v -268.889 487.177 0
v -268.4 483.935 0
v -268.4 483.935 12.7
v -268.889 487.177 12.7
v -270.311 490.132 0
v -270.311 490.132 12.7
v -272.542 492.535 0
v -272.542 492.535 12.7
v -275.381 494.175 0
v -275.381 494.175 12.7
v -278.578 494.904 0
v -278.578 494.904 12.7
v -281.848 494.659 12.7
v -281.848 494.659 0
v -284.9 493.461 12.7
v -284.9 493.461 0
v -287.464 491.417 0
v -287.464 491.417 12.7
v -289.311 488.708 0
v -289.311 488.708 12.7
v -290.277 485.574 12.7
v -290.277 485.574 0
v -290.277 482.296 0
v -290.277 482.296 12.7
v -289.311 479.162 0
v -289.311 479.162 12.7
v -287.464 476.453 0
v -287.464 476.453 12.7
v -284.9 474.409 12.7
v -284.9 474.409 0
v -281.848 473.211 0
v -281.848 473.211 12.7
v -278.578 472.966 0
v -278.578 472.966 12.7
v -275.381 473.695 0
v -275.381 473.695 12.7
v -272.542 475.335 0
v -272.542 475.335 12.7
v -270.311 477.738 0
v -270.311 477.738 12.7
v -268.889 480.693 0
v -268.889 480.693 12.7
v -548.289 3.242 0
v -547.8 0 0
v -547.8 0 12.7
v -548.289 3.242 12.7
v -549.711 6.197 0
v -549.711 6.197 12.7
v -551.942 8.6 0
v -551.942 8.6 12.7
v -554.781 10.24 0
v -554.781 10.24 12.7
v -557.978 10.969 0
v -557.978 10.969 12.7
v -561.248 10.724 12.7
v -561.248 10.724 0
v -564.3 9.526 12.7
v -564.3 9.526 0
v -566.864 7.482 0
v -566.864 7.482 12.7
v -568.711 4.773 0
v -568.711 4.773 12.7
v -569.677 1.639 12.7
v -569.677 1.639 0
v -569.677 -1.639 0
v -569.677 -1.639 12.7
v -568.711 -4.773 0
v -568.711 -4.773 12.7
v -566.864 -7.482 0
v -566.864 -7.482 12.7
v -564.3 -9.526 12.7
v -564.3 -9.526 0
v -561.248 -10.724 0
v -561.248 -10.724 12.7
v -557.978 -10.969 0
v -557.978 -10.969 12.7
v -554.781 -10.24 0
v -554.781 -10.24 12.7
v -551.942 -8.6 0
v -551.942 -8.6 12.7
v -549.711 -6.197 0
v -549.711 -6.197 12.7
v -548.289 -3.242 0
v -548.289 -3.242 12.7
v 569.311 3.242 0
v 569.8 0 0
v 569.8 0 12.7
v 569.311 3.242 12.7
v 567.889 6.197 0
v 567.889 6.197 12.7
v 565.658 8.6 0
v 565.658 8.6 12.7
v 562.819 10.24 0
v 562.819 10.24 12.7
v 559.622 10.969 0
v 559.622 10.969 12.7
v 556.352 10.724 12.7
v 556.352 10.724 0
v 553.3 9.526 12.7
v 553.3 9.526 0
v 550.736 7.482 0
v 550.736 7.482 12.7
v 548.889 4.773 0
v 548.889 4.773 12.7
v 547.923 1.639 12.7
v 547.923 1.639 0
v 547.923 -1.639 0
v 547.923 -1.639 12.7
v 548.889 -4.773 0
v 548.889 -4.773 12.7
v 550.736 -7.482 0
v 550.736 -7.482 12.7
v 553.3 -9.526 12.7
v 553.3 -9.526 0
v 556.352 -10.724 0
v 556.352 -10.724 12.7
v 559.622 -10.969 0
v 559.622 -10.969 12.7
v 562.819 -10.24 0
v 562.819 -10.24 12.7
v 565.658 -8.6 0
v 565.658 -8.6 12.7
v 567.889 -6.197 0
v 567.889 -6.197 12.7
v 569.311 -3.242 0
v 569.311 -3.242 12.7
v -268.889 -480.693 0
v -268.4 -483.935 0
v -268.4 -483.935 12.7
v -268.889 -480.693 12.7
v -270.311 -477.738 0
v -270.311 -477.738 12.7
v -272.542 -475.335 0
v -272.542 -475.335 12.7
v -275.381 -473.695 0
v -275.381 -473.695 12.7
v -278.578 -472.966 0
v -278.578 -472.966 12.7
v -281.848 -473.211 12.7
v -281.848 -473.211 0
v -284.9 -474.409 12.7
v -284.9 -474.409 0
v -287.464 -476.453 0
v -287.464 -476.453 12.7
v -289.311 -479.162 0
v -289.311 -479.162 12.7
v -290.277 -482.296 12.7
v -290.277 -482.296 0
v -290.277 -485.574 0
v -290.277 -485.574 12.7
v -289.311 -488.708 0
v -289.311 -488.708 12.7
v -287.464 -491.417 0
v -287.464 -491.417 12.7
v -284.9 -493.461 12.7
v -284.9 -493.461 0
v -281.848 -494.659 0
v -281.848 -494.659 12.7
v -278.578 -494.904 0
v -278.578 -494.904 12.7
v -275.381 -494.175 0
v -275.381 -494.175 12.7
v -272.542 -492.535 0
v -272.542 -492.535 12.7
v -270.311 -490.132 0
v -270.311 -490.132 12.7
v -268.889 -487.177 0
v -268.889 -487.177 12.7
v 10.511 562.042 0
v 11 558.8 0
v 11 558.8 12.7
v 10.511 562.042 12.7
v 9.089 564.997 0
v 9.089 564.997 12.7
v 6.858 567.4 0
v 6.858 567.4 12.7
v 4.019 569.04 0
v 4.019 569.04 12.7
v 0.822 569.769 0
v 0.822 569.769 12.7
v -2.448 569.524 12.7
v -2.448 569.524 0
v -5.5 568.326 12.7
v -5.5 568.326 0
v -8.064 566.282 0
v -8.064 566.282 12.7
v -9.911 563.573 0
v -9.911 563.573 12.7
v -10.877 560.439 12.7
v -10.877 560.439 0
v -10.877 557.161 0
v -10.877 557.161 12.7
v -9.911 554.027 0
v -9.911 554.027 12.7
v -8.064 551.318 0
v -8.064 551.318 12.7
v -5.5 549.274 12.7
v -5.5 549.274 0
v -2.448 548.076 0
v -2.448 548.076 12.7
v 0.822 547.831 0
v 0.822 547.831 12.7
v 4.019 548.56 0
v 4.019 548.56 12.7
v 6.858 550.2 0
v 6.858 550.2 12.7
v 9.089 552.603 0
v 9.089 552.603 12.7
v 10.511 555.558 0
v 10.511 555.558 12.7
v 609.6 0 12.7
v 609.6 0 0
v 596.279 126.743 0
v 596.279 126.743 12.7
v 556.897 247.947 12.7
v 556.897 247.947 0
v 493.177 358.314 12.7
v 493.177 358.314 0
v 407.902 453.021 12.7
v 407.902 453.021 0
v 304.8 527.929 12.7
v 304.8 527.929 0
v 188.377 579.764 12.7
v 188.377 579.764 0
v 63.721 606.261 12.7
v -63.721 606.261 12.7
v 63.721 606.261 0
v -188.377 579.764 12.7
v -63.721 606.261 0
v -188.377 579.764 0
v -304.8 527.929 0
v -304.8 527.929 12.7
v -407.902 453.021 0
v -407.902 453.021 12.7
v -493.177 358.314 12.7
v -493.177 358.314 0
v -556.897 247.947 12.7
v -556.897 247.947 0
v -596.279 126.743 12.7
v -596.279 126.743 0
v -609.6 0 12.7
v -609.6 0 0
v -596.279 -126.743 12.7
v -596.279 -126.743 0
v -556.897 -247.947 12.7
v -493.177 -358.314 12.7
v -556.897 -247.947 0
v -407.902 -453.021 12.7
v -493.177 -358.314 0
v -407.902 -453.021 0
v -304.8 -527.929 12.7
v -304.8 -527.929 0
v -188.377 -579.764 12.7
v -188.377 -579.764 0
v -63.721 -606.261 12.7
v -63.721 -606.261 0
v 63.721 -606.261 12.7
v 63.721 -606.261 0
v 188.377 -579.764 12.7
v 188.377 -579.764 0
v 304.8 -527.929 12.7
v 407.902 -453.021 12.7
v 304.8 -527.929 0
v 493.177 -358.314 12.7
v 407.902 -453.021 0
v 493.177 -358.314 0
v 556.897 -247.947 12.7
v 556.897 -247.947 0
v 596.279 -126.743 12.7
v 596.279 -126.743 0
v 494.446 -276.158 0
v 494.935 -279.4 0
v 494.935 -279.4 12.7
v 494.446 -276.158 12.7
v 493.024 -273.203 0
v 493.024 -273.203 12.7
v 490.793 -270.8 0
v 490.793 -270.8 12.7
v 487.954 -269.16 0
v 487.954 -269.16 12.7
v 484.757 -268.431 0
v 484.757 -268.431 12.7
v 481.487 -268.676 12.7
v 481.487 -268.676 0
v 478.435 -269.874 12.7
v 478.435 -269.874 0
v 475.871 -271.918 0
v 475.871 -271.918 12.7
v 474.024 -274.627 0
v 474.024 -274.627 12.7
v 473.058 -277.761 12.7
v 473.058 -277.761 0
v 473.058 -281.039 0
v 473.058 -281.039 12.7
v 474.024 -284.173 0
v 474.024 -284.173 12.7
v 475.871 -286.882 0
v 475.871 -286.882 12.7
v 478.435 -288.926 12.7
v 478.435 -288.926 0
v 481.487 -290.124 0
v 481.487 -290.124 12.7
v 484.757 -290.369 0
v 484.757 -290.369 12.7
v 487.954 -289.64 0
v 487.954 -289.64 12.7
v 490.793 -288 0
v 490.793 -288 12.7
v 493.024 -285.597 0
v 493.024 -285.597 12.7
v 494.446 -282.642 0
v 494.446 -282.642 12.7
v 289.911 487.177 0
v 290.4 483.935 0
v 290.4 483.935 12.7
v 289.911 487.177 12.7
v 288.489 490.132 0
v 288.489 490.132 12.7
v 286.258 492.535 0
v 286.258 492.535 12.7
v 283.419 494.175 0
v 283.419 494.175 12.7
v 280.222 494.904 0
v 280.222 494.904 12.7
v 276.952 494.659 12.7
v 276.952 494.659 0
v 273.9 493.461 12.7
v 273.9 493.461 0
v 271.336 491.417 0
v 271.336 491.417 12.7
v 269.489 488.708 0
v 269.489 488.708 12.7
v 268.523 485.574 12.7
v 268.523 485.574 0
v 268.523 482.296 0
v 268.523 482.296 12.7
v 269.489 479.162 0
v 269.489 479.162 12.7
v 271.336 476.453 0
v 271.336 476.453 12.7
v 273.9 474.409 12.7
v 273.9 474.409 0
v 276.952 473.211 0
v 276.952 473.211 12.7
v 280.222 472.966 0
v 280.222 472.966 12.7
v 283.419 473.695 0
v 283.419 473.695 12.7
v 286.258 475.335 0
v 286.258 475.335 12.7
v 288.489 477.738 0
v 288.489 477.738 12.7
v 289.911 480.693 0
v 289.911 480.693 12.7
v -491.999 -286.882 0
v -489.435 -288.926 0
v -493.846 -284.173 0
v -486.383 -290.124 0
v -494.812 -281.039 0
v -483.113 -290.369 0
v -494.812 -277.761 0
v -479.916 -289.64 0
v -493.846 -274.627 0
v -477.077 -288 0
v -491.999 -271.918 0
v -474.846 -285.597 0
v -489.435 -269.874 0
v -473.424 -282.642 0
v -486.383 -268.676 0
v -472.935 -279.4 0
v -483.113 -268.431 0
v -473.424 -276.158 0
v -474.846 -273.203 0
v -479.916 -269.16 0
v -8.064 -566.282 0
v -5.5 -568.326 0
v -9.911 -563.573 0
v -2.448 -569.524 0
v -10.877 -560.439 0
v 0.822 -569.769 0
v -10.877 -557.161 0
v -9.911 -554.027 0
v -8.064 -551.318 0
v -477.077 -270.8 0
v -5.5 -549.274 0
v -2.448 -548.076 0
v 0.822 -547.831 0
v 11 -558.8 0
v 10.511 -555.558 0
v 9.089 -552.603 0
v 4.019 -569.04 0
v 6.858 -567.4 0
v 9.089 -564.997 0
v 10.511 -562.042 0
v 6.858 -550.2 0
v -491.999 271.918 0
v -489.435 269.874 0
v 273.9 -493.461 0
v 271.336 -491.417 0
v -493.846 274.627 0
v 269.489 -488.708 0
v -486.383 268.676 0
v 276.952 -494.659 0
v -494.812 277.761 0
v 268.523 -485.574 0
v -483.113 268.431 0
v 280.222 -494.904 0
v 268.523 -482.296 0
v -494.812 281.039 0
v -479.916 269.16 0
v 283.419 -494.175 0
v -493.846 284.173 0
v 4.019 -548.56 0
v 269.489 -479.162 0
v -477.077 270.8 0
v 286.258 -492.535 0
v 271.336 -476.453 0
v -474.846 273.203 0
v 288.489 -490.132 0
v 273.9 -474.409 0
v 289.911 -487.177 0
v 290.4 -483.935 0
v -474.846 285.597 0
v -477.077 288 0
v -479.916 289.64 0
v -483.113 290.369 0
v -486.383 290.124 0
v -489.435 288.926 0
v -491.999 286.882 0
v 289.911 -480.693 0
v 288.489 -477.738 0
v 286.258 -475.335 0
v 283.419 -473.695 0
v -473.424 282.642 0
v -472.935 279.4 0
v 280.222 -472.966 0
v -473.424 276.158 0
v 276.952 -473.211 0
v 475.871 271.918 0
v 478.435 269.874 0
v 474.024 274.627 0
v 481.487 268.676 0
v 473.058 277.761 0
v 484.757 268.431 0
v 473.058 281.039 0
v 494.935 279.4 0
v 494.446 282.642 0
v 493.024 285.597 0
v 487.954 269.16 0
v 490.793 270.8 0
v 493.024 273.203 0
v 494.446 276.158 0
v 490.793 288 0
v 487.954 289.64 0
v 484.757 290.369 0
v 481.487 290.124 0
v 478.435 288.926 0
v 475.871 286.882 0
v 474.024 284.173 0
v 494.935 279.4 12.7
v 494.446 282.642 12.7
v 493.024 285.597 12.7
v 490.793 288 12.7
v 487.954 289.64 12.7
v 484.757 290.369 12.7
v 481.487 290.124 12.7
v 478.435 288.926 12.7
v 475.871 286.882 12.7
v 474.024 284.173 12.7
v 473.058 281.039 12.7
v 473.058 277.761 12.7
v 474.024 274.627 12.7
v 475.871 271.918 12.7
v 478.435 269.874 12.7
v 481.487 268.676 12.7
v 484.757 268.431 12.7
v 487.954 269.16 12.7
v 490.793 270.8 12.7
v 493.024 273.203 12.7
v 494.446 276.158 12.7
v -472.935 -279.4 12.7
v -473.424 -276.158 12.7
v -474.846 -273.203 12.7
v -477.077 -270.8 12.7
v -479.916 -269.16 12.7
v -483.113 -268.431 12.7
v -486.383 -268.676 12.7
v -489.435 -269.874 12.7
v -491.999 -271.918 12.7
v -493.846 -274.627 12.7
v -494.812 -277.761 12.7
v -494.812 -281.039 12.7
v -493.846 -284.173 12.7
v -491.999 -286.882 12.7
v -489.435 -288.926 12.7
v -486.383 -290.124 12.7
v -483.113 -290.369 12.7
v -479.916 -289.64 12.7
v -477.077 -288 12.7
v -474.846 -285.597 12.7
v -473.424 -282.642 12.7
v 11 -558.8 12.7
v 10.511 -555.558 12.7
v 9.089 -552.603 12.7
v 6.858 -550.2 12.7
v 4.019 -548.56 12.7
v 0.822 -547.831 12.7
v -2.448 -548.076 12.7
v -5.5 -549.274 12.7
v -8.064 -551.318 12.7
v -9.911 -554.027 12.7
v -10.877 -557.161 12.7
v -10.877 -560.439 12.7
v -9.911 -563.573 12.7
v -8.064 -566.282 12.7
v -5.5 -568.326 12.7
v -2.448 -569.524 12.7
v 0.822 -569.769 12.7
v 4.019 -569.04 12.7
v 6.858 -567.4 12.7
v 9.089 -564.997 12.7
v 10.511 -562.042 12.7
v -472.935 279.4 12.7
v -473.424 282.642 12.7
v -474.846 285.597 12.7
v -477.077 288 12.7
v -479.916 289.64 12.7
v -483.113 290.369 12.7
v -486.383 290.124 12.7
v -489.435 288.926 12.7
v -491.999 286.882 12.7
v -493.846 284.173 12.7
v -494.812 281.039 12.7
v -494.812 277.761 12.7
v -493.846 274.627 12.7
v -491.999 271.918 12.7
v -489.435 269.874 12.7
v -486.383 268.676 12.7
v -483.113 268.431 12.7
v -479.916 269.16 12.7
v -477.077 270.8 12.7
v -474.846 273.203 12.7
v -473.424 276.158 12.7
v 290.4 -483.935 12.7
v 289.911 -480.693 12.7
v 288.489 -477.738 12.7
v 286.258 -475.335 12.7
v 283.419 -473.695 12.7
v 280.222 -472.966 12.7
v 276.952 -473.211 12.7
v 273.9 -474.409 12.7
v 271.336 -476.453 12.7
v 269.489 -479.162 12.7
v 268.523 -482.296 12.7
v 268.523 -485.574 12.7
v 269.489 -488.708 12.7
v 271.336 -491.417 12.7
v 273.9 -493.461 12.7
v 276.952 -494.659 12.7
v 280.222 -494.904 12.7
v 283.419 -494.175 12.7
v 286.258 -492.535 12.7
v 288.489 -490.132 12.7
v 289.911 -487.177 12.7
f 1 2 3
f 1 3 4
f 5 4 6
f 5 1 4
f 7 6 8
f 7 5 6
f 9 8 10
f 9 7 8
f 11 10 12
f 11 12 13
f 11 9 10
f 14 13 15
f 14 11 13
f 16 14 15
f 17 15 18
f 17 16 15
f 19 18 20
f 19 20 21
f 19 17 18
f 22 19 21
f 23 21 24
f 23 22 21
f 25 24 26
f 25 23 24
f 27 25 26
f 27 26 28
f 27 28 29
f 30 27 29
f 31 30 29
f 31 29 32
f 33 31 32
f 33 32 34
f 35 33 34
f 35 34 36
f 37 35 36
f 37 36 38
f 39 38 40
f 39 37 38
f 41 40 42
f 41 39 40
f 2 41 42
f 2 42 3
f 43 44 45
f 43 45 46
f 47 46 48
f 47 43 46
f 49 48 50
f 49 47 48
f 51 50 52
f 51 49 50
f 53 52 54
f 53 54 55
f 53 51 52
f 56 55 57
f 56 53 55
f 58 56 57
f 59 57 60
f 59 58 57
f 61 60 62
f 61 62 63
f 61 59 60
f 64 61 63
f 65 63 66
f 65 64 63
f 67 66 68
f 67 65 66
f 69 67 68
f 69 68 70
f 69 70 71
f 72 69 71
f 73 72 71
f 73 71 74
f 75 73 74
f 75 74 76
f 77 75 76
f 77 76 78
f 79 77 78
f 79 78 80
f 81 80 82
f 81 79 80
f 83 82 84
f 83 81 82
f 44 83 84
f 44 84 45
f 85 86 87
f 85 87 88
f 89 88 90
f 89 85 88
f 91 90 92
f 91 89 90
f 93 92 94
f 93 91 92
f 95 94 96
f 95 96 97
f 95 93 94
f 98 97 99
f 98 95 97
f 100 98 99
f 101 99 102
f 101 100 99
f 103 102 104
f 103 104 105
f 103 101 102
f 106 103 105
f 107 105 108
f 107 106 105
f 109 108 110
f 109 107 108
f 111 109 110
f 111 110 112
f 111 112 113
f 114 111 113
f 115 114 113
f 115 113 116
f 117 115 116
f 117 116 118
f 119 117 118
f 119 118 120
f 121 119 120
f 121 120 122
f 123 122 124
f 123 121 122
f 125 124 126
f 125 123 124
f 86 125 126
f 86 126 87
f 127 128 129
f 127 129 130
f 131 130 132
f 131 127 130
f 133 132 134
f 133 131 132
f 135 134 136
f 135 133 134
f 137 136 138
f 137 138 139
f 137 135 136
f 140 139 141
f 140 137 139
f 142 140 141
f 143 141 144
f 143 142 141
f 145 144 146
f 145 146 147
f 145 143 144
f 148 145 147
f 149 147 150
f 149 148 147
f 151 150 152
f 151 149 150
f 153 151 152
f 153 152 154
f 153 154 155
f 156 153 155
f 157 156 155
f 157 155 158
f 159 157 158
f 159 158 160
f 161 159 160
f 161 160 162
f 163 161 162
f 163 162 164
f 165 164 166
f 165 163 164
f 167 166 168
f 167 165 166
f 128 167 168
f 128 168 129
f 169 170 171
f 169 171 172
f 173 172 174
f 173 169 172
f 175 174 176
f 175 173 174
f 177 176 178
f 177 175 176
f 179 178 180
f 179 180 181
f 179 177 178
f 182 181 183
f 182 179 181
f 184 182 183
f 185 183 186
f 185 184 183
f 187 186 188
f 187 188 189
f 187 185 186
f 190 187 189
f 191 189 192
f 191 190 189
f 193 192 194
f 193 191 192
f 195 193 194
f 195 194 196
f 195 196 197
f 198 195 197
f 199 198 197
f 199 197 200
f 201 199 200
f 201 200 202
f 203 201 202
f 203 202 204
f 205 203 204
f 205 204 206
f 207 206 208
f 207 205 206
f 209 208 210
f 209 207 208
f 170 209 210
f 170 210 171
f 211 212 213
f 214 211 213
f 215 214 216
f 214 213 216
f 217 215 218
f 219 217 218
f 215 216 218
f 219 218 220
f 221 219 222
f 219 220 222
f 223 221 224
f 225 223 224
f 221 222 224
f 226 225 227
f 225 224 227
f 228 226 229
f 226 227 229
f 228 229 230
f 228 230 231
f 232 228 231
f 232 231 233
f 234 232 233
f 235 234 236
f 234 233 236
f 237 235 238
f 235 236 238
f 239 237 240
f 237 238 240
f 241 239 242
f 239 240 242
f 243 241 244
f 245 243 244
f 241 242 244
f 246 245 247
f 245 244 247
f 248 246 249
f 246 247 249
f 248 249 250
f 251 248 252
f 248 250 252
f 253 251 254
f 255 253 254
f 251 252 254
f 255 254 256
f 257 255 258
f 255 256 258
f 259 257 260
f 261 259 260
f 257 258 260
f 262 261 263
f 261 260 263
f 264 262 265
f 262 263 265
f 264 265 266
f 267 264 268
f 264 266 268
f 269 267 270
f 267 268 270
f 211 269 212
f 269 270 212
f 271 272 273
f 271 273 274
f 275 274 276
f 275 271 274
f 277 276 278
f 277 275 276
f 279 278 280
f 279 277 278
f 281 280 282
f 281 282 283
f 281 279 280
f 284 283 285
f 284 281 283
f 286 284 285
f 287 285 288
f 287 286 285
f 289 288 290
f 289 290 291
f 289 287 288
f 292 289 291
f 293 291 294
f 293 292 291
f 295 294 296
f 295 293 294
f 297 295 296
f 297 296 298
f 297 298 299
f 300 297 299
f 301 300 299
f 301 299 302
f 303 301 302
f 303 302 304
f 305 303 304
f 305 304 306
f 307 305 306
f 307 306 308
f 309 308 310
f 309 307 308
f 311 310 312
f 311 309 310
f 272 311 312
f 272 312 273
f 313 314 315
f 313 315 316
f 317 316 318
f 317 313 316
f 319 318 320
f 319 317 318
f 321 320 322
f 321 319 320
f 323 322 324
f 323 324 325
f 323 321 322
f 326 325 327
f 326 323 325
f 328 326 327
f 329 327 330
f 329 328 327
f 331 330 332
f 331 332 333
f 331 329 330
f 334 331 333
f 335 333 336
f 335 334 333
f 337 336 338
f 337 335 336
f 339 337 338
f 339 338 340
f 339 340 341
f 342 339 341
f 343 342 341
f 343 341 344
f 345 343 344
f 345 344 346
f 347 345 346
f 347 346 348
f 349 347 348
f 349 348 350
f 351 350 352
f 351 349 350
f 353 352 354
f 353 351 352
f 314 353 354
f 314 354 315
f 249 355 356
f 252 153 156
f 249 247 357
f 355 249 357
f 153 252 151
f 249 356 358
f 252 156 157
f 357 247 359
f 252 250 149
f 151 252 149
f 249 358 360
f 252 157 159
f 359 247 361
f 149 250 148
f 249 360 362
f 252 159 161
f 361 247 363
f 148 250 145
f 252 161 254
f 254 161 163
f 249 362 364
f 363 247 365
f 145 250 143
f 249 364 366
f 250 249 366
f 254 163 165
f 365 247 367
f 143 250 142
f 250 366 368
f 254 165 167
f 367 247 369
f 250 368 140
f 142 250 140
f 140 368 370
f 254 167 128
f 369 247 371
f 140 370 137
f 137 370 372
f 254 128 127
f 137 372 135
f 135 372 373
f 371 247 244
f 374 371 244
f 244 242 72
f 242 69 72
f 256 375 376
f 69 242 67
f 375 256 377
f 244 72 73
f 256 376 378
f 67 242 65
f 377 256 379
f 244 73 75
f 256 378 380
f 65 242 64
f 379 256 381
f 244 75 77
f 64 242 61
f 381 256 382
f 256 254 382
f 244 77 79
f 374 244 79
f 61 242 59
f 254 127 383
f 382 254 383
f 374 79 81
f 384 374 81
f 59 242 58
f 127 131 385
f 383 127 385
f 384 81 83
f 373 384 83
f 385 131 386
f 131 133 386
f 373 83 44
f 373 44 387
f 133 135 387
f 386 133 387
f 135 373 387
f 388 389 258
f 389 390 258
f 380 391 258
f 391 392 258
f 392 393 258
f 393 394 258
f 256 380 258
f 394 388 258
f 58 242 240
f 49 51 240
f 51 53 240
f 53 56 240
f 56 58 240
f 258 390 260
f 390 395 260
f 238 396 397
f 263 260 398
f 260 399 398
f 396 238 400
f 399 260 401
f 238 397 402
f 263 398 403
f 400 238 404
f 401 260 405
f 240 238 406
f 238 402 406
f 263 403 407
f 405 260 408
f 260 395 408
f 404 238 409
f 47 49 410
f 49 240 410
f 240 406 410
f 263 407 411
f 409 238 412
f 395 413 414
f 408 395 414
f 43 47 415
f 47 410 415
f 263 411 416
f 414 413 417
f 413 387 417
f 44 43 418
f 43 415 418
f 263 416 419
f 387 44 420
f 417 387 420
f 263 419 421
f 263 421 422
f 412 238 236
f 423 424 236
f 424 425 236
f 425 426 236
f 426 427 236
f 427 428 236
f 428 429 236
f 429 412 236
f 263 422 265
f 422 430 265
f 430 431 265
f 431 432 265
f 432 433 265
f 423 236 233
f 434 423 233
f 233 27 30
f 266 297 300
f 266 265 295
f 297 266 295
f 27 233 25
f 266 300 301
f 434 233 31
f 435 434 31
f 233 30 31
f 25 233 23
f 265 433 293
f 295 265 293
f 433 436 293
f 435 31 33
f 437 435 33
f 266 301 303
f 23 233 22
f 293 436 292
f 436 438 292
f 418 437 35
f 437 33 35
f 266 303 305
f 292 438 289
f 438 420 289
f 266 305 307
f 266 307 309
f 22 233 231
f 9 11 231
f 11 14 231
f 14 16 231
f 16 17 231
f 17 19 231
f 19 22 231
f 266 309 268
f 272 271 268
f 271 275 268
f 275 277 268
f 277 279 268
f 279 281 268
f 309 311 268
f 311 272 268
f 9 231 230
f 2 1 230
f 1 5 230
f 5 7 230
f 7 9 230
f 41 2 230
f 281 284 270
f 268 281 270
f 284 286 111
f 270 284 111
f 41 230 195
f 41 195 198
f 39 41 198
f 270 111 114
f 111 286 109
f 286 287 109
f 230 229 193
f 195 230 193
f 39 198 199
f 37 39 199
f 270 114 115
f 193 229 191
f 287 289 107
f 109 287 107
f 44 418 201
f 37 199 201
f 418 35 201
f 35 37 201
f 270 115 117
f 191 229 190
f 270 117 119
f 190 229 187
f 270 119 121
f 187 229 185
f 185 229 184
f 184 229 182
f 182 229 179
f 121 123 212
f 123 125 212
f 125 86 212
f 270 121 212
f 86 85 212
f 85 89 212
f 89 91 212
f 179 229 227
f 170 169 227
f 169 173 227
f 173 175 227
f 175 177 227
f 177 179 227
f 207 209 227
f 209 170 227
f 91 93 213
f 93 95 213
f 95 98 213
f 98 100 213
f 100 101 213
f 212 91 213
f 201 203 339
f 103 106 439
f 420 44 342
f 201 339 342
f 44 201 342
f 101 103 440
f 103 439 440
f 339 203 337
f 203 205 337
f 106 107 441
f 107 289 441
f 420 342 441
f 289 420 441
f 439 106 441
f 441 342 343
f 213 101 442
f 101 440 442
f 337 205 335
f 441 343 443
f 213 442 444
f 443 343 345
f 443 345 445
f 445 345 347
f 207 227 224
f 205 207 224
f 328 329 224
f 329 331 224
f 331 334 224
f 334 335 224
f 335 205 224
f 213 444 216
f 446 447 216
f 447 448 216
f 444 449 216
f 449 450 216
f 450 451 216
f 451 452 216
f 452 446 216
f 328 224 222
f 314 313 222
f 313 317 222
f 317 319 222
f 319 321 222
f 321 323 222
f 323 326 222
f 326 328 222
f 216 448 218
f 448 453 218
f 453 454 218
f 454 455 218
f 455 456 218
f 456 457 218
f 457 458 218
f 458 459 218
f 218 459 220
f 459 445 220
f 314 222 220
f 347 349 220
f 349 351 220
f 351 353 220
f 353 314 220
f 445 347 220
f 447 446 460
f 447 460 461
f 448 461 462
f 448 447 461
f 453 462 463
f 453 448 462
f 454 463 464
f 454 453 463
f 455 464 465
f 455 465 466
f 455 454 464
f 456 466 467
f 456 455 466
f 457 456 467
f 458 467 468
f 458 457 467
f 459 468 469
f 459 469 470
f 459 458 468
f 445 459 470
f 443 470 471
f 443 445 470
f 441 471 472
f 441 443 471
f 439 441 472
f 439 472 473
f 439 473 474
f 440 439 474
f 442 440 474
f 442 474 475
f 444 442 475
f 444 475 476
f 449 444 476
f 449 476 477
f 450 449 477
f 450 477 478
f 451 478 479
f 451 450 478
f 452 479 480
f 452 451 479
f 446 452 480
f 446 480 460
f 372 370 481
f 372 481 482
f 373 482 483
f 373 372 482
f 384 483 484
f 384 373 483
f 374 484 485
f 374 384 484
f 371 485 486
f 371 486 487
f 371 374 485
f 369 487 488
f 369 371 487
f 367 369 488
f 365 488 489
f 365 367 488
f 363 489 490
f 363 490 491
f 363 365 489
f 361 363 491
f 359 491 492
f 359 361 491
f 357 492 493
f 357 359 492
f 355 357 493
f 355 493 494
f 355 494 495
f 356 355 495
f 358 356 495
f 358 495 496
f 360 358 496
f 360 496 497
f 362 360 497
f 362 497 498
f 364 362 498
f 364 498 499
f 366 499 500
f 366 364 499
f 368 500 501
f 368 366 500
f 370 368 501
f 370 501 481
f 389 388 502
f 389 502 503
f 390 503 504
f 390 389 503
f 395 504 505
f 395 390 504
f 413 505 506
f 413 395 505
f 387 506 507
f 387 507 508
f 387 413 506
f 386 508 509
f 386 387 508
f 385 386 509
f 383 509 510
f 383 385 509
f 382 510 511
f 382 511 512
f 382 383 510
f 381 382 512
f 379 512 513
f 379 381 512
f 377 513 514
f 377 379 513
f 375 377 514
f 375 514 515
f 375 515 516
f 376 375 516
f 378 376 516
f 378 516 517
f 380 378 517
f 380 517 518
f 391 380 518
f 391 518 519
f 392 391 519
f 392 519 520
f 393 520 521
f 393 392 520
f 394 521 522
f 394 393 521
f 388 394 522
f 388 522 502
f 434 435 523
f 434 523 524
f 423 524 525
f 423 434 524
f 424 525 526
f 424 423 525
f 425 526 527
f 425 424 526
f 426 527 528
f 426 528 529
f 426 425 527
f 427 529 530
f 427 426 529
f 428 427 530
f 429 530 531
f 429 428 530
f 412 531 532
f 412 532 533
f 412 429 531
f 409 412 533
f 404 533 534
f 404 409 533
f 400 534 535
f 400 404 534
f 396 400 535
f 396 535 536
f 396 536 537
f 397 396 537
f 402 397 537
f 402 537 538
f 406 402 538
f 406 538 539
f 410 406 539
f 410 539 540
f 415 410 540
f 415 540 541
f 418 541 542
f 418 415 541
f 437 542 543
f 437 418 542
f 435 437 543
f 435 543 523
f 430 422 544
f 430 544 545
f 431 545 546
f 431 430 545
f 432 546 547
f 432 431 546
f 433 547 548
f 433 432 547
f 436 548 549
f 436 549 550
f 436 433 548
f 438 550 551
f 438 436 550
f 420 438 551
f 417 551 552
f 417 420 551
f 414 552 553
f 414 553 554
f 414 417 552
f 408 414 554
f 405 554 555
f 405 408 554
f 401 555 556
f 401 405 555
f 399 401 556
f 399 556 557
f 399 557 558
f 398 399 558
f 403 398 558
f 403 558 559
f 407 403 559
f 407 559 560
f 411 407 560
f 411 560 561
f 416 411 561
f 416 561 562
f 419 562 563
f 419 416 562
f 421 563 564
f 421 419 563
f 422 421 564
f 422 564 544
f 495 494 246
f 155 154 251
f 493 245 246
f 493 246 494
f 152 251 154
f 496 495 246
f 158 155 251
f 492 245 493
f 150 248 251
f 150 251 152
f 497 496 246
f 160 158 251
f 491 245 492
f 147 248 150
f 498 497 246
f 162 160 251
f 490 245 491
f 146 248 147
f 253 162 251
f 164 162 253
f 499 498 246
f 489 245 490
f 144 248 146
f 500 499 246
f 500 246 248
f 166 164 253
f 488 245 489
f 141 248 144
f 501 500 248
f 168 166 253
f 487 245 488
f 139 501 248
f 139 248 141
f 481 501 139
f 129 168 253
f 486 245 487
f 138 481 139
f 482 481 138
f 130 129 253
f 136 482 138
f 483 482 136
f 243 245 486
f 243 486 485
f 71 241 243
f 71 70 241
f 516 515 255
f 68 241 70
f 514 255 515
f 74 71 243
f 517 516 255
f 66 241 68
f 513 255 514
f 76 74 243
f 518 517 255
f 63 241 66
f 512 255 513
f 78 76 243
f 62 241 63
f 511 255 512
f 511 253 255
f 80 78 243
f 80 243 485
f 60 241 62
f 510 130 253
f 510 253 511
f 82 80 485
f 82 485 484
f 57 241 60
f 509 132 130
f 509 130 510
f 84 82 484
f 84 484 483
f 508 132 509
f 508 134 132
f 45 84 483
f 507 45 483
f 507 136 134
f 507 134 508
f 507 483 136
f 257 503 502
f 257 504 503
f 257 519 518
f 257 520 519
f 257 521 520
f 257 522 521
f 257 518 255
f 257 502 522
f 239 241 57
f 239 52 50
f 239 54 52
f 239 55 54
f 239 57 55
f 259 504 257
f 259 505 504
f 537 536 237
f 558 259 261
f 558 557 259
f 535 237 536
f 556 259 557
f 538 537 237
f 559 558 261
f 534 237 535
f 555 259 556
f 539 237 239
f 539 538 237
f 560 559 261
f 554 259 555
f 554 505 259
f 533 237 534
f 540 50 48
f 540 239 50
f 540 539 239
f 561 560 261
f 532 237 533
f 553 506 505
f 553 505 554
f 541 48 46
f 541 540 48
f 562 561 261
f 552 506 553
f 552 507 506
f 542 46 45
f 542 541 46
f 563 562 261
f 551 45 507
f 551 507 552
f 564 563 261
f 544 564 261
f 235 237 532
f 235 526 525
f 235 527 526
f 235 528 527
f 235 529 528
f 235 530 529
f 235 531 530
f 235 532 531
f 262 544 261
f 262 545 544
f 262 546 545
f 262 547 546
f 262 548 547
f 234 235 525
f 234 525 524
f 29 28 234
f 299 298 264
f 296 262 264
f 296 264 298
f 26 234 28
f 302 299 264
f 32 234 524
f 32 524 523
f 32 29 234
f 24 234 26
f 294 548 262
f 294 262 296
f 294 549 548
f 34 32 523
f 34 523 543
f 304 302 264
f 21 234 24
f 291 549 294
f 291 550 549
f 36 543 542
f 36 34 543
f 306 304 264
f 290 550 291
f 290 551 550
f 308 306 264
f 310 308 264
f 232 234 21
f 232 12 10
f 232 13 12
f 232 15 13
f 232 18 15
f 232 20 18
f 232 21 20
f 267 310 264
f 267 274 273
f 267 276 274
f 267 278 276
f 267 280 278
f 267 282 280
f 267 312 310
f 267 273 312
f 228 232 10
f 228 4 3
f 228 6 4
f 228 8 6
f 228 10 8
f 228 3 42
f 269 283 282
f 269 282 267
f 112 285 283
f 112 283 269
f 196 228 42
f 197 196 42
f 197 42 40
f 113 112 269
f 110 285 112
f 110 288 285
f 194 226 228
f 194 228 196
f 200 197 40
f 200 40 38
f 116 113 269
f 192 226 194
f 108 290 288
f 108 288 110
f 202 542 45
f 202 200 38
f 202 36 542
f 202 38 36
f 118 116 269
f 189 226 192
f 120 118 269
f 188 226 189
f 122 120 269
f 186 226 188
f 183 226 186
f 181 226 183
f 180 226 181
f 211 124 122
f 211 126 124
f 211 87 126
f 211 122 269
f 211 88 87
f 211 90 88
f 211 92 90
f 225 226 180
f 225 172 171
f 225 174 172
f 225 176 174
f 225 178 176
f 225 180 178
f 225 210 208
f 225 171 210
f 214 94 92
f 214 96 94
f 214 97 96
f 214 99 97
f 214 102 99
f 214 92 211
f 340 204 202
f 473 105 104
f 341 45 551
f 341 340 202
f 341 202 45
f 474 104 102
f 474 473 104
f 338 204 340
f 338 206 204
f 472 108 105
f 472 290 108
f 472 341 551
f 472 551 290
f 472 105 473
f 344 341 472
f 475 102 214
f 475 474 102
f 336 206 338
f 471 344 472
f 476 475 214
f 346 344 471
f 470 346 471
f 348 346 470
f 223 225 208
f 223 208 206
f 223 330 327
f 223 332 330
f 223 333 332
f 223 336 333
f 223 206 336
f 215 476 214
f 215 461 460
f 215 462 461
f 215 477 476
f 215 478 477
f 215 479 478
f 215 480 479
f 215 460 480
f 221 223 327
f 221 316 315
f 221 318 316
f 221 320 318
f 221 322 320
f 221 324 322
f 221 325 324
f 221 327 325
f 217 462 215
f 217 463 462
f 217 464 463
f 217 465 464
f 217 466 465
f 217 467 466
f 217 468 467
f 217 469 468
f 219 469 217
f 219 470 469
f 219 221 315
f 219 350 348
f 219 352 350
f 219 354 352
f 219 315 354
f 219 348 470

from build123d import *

# Parameters (mm, degrees)
SKETCH1_R           = 609.6
BOSS_EXTRUDE1_DEPTH = 12.7
SKETCH2_R           = 11
CUT_EXTRUDE1_DEPTH  = 12.7


with BuildPart() as part:
    # Sketch1 → Boss-Extrude1 (new body)
    with BuildSketch(Plane.XY):
        Circle(SKETCH1_R)
    extrude(amount=BOSS_EXTRUDE1_DEPTH)

    # Sketch2 → Cut-Extrude1 (cut)
    with BuildSketch(Plane.XY):
        with Locations((0, 558.8)):
            Circle(SKETCH2_R)
        with Locations((279.4, 483.934995635)):
            Circle(SKETCH2_R)
        with Locations((483.934995635, 279.4)):
            Circle(SKETCH2_R)
        with Locations((558.8, 0)):
            Circle(SKETCH2_R)
        with Locations((483.934995635, -279.4)):
            Circle(SKETCH2_R)
        with Locations((279.4, -483.934995635)):
            Circle(SKETCH2_R)
        with Locations((0, -558.8)):
            Circle(SKETCH2_R)
        with Locations((-279.4, -483.934995635)):
            Circle(SKETCH2_R)
        with Locations((-483.934995635, -279.4)):
            Circle(SKETCH2_R)
        with Locations((-558.8, 0)):
            Circle(SKETCH2_R)
        with Locations((-483.934995635, 279.4)):
            Circle(SKETCH2_R)
        with Locations((-279.4, 483.934995635)):
            Circle(SKETCH2_R)
    extrude(amount=CUT_EXTRUDE1_DEPTH, mode=Mode.SUBTRACT)


solid = part.part
